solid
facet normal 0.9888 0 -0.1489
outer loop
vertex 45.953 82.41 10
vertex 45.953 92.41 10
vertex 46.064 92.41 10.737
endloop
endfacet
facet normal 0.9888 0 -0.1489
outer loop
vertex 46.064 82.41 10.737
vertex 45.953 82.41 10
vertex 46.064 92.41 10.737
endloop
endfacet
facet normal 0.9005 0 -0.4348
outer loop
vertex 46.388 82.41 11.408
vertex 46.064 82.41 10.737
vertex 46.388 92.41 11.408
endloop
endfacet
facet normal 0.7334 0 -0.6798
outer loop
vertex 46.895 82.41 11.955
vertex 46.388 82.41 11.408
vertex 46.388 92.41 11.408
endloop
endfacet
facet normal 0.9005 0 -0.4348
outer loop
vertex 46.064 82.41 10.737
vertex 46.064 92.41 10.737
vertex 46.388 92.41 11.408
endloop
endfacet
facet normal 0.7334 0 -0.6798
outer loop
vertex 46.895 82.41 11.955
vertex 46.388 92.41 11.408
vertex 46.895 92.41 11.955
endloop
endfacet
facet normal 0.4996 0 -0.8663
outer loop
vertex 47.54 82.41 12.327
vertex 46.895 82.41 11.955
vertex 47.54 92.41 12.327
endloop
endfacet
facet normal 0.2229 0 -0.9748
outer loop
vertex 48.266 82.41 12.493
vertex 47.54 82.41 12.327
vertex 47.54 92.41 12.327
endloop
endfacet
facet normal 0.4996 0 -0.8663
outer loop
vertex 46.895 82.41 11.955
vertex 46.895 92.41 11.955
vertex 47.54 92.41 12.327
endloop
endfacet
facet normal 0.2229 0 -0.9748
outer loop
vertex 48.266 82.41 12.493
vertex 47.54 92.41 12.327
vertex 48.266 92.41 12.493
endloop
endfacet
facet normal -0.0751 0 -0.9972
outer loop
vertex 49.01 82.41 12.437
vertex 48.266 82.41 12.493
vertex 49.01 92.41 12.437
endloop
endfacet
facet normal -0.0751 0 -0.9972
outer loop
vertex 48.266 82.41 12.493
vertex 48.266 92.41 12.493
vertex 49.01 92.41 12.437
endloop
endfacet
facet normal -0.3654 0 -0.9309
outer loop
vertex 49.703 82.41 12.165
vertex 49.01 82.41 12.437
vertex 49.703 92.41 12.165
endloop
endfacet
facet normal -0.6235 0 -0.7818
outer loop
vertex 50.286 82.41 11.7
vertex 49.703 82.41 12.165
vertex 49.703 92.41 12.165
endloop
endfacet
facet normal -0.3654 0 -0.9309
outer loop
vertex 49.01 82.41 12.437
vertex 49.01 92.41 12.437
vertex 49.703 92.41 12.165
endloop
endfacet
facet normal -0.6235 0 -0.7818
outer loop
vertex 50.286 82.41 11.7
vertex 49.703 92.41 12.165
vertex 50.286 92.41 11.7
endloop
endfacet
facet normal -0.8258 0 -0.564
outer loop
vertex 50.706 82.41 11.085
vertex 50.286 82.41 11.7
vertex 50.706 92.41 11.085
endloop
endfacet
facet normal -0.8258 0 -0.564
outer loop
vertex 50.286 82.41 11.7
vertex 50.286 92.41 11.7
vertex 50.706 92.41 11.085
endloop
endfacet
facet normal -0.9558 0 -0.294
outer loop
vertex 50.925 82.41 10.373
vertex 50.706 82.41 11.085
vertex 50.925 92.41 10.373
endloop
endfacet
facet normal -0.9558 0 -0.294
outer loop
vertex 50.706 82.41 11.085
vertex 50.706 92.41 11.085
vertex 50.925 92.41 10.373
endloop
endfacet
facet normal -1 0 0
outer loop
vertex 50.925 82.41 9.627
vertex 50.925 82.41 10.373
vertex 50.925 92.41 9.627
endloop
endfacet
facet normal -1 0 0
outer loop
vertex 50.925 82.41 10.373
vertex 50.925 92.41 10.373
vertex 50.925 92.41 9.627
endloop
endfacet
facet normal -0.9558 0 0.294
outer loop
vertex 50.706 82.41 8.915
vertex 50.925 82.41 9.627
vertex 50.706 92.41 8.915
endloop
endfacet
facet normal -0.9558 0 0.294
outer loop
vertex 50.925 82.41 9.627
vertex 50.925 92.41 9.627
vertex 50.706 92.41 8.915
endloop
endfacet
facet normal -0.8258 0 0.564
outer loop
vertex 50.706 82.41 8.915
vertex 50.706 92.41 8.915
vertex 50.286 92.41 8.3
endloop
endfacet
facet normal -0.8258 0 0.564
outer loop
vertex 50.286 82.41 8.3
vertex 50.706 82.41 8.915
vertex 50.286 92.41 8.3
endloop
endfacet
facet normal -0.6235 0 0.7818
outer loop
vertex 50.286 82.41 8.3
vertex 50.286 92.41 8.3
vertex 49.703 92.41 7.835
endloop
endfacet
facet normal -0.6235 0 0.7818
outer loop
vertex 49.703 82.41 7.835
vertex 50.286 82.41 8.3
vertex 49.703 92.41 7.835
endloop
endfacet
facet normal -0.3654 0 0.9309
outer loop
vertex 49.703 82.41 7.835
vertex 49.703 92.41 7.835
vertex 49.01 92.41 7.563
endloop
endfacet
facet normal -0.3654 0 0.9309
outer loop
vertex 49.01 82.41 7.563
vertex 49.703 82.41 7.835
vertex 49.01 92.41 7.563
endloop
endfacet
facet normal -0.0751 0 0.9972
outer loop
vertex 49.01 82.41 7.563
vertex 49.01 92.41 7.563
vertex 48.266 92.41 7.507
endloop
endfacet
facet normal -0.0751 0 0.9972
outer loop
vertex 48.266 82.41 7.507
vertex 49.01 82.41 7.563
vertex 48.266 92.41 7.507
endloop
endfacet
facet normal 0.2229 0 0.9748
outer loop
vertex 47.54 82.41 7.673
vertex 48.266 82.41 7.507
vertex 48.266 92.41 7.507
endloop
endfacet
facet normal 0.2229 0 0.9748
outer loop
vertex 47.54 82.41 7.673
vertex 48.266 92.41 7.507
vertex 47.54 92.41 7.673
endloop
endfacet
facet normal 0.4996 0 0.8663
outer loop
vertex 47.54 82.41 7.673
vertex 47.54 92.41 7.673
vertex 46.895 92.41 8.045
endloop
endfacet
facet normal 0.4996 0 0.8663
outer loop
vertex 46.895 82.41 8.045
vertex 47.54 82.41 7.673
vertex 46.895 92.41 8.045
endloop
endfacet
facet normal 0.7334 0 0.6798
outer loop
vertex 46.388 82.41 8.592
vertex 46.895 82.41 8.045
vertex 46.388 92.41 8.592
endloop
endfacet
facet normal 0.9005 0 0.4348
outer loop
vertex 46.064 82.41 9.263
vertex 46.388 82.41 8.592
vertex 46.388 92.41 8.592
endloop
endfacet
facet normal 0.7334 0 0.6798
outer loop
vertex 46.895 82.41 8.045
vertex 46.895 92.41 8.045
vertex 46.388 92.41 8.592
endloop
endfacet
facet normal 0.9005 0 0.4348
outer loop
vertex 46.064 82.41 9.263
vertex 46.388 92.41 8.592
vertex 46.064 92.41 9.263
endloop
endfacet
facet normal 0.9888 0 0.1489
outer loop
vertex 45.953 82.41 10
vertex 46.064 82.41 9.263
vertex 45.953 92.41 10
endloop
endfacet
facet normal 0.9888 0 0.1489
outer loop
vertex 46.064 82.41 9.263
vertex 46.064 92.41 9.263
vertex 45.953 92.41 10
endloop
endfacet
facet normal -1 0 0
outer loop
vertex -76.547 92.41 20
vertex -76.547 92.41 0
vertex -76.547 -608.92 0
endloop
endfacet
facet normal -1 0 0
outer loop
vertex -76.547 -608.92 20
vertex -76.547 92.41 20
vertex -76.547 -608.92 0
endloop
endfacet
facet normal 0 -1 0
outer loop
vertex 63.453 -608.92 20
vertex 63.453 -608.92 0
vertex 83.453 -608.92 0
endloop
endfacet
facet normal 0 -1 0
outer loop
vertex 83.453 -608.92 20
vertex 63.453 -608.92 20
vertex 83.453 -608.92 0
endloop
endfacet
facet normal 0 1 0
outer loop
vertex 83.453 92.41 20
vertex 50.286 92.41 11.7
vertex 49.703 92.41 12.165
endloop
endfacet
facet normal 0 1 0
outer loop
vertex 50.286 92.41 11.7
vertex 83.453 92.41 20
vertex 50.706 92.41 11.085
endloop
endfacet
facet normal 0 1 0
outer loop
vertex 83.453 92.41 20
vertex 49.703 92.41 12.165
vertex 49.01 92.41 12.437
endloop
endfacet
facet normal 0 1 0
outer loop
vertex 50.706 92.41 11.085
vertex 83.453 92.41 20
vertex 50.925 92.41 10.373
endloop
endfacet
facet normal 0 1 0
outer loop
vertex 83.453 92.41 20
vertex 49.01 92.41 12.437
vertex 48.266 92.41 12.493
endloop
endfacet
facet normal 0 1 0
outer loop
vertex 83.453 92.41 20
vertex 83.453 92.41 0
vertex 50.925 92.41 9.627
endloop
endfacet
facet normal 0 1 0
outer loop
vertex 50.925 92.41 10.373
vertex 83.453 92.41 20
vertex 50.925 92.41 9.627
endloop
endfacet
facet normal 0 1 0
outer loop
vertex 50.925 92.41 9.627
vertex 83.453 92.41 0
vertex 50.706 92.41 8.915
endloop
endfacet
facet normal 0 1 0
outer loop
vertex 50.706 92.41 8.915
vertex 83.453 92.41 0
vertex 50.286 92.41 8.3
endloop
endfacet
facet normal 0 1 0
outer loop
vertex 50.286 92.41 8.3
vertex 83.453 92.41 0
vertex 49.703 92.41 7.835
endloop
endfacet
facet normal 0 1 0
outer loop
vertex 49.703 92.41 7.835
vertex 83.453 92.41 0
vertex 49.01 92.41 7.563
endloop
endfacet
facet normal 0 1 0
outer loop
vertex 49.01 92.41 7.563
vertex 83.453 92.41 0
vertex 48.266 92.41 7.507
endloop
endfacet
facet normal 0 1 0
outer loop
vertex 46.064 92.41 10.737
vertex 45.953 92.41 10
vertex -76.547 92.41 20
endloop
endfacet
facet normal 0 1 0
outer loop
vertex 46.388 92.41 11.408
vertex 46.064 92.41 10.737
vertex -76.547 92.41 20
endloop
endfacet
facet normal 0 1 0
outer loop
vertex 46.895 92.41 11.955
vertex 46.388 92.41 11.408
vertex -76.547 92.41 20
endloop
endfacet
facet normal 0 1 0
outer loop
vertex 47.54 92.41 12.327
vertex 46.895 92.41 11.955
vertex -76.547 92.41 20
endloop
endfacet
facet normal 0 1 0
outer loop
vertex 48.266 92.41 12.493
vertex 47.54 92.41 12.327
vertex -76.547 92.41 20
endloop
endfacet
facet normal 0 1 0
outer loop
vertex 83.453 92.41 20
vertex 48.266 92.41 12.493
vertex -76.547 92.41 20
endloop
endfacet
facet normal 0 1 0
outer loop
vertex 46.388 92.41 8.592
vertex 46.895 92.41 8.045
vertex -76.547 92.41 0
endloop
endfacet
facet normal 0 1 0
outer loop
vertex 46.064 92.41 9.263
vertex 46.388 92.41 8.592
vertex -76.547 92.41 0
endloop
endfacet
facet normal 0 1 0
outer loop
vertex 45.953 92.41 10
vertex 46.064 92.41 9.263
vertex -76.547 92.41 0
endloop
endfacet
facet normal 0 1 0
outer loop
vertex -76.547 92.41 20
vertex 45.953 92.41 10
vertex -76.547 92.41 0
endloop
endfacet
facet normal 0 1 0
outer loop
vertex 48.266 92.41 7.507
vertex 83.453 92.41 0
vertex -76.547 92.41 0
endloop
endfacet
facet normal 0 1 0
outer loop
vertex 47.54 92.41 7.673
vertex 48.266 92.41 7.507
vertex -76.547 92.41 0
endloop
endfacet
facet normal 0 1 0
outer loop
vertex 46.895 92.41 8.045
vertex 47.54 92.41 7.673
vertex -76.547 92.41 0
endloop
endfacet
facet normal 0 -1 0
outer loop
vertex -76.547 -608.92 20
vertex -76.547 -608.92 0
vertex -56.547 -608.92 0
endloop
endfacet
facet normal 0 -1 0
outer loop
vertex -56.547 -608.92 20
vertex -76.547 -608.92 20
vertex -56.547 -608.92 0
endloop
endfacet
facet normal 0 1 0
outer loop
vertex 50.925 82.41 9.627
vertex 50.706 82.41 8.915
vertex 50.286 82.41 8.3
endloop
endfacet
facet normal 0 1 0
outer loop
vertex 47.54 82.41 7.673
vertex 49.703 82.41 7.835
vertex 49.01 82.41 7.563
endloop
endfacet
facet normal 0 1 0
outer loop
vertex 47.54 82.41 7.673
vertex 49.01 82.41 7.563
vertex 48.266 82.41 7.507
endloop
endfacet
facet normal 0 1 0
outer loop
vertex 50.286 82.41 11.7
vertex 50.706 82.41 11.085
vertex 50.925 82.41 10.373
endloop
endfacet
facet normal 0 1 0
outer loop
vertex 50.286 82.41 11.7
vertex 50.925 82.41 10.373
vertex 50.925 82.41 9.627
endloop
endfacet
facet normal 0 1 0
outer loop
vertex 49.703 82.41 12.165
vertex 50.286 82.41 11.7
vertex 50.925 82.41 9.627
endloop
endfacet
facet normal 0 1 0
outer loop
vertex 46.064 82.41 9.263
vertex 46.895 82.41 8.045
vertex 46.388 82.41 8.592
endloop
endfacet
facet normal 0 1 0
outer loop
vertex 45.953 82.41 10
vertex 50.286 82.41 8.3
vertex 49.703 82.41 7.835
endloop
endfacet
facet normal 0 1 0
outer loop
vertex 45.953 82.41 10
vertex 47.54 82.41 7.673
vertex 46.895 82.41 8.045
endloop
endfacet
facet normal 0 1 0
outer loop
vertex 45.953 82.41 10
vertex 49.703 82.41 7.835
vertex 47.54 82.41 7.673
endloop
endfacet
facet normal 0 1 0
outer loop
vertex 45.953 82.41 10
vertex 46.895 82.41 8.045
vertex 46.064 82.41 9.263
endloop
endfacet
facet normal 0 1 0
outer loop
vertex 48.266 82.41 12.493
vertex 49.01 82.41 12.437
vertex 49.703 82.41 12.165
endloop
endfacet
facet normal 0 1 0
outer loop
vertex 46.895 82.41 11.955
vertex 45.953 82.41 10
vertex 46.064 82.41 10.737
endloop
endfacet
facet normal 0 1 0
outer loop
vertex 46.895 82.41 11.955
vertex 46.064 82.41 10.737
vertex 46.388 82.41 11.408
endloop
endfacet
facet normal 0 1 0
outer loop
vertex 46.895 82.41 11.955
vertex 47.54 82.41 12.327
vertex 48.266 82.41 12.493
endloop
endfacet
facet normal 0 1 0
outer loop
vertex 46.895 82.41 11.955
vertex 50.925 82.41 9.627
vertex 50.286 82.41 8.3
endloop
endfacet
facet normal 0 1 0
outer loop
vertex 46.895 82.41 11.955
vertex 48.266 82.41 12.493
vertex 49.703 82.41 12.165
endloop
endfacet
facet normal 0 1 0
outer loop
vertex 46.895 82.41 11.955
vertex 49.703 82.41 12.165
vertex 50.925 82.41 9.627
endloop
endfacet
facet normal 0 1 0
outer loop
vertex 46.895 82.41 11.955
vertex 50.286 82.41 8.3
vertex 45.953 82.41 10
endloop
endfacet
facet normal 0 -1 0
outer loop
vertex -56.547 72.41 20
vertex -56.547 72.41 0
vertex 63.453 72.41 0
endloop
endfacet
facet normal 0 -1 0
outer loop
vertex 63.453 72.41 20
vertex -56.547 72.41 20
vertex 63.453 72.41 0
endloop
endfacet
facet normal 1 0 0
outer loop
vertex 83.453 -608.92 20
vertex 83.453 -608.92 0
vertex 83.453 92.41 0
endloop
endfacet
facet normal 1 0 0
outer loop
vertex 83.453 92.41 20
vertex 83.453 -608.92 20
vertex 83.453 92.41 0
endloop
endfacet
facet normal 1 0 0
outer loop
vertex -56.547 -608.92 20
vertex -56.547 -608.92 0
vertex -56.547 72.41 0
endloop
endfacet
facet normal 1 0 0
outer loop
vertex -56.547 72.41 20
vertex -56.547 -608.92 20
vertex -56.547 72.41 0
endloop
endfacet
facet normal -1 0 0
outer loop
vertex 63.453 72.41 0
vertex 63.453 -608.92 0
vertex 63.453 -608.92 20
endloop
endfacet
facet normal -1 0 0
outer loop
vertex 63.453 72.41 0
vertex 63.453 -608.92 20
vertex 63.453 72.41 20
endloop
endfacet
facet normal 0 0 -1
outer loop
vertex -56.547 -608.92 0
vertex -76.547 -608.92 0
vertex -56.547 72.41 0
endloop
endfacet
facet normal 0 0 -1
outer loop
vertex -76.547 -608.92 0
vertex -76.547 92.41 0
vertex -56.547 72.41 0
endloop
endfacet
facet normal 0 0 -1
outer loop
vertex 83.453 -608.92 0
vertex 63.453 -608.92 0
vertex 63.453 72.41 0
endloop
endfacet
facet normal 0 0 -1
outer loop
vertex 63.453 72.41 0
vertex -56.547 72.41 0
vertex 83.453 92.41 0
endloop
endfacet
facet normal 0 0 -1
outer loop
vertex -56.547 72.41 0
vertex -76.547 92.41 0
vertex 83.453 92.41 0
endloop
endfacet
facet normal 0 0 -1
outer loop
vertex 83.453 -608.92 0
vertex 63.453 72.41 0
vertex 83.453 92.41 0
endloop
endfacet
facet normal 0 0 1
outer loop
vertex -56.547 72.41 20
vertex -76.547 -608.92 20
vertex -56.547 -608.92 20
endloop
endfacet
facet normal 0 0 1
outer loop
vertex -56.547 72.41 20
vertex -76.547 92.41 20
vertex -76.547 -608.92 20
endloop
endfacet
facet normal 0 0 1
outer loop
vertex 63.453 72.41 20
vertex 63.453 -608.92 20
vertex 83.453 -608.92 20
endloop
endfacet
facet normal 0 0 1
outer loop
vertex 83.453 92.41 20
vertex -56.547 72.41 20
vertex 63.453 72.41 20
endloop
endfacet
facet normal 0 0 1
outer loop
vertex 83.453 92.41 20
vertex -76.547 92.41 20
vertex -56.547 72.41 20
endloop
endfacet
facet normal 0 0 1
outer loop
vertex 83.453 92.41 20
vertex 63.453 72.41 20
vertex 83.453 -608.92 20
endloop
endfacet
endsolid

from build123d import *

# Parameters (mm, degrees)
SKETCH1_W           = 20
SKETCH1_H           = 681.33
BOSS_EXTRUDE1_DEPTH = 20
SKETCH2_R           = 2.5
CUT_EXTRUDE1_DEPTH  = 10


with BuildPart() as part:
    # Sketch1 → Boss-Extrude1 (new body)
    with BuildSketch(Plane.XY):
        with Locations((-66.54676259, -268.254928058)):
            Rectangle(SKETCH1_W, SKETCH1_H)
        with Locations((73.45323741, -268.254928058)):
            Rectangle(SKETCH1_W, SKETCH1_H)
        Polygon((-76.54676259, 92.410071942), (-76.54676259, 72.410071942), (-56.54676259, 72.410071942), (63.45323741, 72.410071942), (83.45323741, 72.410071942), (83.45323741, 92.410071942), align=None)
    extrude(amount=BOSS_EXTRUDE1_DEPTH)

    # Sketch2 → Cut-Extrude1 (cut)
    with BuildSketch(Plane(origin=(0, 92.410071942, 0), x_dir=(1, 0, 0), z_dir=(0, 1, 0))):
        with Locations(Location((48.45323741, -10, 0), (0, 0, 180))):
            Circle(SKETCH2_R)
    extrude(amount=-CUT_EXTRUDE1_DEPTH, mode=Mode.SUBTRACT)


solid = part.part
